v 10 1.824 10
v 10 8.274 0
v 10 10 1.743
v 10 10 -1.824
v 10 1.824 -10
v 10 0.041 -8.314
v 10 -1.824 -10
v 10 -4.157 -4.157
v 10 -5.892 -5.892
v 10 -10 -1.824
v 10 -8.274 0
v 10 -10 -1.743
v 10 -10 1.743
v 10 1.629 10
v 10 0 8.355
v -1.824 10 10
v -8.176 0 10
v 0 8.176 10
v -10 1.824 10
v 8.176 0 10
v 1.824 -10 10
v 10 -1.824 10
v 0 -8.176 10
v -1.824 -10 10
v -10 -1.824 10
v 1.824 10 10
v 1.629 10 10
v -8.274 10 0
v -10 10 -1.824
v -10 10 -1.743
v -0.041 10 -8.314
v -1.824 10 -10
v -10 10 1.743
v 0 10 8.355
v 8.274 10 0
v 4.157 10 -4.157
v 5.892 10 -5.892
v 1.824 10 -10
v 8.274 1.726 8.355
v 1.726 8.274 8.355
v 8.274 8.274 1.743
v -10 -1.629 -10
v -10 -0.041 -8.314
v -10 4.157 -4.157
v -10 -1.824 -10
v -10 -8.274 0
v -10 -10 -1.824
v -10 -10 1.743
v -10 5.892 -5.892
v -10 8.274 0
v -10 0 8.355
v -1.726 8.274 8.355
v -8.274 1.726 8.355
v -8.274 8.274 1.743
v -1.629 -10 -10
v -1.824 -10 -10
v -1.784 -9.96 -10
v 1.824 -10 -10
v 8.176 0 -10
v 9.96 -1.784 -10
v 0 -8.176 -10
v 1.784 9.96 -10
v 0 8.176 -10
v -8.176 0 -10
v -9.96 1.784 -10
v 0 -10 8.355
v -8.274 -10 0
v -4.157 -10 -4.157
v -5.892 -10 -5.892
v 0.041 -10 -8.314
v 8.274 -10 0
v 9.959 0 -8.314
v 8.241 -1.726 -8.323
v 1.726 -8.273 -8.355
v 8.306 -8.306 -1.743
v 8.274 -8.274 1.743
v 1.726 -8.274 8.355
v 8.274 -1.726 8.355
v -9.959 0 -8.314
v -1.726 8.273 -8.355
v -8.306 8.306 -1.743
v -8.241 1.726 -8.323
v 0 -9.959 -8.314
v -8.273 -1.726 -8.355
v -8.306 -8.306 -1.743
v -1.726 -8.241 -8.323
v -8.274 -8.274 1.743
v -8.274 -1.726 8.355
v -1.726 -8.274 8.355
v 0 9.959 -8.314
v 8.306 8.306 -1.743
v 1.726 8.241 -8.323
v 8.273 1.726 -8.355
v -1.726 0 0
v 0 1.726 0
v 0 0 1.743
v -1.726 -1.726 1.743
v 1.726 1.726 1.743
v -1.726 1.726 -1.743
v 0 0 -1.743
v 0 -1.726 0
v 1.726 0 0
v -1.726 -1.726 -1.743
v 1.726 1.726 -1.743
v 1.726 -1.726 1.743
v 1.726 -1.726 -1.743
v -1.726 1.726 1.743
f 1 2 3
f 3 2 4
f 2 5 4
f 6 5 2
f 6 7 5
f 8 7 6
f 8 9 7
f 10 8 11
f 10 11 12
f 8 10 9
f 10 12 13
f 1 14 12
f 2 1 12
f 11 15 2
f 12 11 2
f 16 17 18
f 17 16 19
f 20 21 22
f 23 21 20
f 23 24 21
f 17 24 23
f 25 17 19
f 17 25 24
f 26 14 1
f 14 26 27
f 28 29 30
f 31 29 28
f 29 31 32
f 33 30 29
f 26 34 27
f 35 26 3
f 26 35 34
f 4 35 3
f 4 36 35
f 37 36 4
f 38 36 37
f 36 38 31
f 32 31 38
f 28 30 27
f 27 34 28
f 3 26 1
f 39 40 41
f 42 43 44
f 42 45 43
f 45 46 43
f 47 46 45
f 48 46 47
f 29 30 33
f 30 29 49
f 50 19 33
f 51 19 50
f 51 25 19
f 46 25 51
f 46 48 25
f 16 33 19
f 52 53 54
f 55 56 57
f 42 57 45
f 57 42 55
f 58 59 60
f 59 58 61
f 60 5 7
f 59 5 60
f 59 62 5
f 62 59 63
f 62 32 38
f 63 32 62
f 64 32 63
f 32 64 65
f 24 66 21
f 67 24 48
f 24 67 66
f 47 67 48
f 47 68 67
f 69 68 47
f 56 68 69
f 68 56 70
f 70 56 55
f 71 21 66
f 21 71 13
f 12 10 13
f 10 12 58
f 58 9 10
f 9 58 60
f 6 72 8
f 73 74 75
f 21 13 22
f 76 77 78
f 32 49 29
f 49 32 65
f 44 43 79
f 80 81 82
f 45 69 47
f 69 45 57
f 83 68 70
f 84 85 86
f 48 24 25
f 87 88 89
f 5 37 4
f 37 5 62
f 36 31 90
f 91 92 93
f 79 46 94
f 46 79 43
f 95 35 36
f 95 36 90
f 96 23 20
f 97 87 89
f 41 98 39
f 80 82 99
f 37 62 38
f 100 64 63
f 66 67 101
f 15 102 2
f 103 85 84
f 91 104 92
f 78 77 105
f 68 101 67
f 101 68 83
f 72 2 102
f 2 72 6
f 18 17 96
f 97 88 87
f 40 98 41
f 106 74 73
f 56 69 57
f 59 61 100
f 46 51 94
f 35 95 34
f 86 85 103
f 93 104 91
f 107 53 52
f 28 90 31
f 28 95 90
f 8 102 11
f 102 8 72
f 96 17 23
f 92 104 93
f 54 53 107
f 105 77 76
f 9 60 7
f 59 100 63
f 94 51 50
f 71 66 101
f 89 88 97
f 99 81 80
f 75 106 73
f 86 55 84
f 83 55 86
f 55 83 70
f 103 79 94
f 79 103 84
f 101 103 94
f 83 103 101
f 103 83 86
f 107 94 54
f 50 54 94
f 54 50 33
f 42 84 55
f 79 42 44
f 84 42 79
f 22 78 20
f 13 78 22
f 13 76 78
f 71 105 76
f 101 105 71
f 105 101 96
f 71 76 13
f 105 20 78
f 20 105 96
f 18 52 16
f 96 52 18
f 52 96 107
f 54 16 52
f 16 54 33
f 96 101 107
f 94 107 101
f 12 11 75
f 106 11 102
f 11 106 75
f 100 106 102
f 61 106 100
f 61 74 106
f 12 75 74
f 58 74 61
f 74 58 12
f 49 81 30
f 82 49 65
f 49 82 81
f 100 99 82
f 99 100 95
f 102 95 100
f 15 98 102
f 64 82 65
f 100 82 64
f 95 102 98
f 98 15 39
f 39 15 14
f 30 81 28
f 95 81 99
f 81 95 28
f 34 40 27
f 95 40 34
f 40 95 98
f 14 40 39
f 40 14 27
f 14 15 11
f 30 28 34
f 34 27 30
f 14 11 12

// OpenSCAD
cube_size=20; 
thickness_of_plate=2;
frag="YES";
whole=0;

//Face Centered Cubic
module HexPlate(cube_size,thickness_of_plate,ZRotate){
intersection(){
        cube(cube_size,center=true);
        rotate([0,-55,ZRotate]) cube([cube_size*sqrt(2),cube_size*sqrt(2),thickness_of_plate],center=true);
    }
}

module TrianglePlate(cube_size,thickness_of_plate){
    intersection(){
        cube(cube_size,center=true);
        translate([10,10,0]) rotate([55,0,135]) cube([2*cube_size*sqrt(2),2*cube_size*sqrt(2),thickness_of_plate],center=true);
    }
}

if(frag=="YES"){
z=12-whole;
difference(){
    union(){
        for(k=[1:z]){
            if(k==12) HexPlate(cube_size,thickness_of_plate,45);
            if(k==11) HexPlate(cube_size,thickness_of_plate,225);
            if(k==10) HexPlate(cube_size,thickness_of_plate,135);
            if(k==9) HexPlate(cube_size,thickness_of_plate,315);
            //TRIANGULAR PLATES
            if(k==8) rotate([0,90,0]) TrianglePlate(cube_size,thickness_of_plate);
            if(k==7) rotate([0,0,-180]) TrianglePlate(cube_size,thickness_of_plate);
            if(k==6) rotate([0,90,-180]) TrianglePlate(cube_size,thickness_of_plate);
            if(k==5) TrianglePlate(cube_size,thickness_of_plate);
            if(k==4) rotate([0,90,90]) TrianglePlate(cube_size,thickness_of_plate);
            if(k==3) rotate([0,0,-90]) TrianglePlate(cube_size,thickness_of_plate);
            if(k==2) rotate([0,90,-90]) TrianglePlate(cube_size,thickness_of_plate);
            if(k==1) rotate([0,0,90]) TrianglePlate(cube_size,thickness_of_plate);    
        }
    }
    union(){
        for(x=[1:whole]){
            if(x==1) HexPlate(cube_size,thickness_of_plate,45);
            if(x==2) HexPlate(cube_size,thickness_of_plate,225);
            if(x==3) HexPlate(cube_size,thickness_of_plate,135);
            if(x==4) HexPlate(cube_size,thickness_of_plate,315);
            //TRIANGULAR PLATES
            if(x==5) rotate([0,90,0]) TrianglePlate(cube_size,thickness_of_plate);
            if(x==6) rotate([0,0,-180]) TrianglePlate(cube_size,thickness_of_plate);
            if(x==7) rotate([0,90,-180]) TrianglePlate(cube_size,thickness_of_plate);
            if(x==8) TrianglePlate(cube_size,thickness_of_plate);
            if(x==9) rotate([0,90,90]) TrianglePlate(cube_size,thickness_of_plate);
            if(x==10) rotate([0,0,-90]) TrianglePlate(cube_size,thickness_of_plate);
            if(x==11) rotate([0,90,-90]) TrianglePlate(cube_size,thickness_of_plate);
            if(x==12) rotate([0,0,90]) TrianglePlate(cube_size,thickness_of_plate);
        }
    }
}
}
else if(frag=="NO"){
    for(x=[1:whole]){
        if(x==1) HexPlate(cube_size,thickness_of_plate,45);
        if(x==2) HexPlate(cube_size,thickness_of_plate,225);
        if(x==3) HexPlate(cube_size,thickness_of_plate,135);
        if(x==4) HexPlate(cube_size,thickness_of_plate,315);
        //TRIANGULAR PLATES
        if(x==5) rotate([0,90,0]) TrianglePlate(cube_size,thickness_of_plate);
        if(x==6) rotate([0,0,-180]) TrianglePlate(cube_size,thickness_of_plate);
        if(x==7) rotate([0,90,-180]) TrianglePlate(cube_size,thickness_of_plate);
        if(x==8) TrianglePlate(cube_size,thickness_of_plate);
        if(x==9) rotate([0,90,90]) TrianglePlate(cube_size,thickness_of_plate);
        if(x==10) rotate([0,0,-90]) TrianglePlate(cube_size,thickness_of_plate);
        if(x==11) rotate([0,90,-90]) TrianglePlate(cube_size,thickness_of_plate);
        if(x==12) rotate([0,0,90]) TrianglePlate(cube_size,thickness_of_plate);
    }
}
